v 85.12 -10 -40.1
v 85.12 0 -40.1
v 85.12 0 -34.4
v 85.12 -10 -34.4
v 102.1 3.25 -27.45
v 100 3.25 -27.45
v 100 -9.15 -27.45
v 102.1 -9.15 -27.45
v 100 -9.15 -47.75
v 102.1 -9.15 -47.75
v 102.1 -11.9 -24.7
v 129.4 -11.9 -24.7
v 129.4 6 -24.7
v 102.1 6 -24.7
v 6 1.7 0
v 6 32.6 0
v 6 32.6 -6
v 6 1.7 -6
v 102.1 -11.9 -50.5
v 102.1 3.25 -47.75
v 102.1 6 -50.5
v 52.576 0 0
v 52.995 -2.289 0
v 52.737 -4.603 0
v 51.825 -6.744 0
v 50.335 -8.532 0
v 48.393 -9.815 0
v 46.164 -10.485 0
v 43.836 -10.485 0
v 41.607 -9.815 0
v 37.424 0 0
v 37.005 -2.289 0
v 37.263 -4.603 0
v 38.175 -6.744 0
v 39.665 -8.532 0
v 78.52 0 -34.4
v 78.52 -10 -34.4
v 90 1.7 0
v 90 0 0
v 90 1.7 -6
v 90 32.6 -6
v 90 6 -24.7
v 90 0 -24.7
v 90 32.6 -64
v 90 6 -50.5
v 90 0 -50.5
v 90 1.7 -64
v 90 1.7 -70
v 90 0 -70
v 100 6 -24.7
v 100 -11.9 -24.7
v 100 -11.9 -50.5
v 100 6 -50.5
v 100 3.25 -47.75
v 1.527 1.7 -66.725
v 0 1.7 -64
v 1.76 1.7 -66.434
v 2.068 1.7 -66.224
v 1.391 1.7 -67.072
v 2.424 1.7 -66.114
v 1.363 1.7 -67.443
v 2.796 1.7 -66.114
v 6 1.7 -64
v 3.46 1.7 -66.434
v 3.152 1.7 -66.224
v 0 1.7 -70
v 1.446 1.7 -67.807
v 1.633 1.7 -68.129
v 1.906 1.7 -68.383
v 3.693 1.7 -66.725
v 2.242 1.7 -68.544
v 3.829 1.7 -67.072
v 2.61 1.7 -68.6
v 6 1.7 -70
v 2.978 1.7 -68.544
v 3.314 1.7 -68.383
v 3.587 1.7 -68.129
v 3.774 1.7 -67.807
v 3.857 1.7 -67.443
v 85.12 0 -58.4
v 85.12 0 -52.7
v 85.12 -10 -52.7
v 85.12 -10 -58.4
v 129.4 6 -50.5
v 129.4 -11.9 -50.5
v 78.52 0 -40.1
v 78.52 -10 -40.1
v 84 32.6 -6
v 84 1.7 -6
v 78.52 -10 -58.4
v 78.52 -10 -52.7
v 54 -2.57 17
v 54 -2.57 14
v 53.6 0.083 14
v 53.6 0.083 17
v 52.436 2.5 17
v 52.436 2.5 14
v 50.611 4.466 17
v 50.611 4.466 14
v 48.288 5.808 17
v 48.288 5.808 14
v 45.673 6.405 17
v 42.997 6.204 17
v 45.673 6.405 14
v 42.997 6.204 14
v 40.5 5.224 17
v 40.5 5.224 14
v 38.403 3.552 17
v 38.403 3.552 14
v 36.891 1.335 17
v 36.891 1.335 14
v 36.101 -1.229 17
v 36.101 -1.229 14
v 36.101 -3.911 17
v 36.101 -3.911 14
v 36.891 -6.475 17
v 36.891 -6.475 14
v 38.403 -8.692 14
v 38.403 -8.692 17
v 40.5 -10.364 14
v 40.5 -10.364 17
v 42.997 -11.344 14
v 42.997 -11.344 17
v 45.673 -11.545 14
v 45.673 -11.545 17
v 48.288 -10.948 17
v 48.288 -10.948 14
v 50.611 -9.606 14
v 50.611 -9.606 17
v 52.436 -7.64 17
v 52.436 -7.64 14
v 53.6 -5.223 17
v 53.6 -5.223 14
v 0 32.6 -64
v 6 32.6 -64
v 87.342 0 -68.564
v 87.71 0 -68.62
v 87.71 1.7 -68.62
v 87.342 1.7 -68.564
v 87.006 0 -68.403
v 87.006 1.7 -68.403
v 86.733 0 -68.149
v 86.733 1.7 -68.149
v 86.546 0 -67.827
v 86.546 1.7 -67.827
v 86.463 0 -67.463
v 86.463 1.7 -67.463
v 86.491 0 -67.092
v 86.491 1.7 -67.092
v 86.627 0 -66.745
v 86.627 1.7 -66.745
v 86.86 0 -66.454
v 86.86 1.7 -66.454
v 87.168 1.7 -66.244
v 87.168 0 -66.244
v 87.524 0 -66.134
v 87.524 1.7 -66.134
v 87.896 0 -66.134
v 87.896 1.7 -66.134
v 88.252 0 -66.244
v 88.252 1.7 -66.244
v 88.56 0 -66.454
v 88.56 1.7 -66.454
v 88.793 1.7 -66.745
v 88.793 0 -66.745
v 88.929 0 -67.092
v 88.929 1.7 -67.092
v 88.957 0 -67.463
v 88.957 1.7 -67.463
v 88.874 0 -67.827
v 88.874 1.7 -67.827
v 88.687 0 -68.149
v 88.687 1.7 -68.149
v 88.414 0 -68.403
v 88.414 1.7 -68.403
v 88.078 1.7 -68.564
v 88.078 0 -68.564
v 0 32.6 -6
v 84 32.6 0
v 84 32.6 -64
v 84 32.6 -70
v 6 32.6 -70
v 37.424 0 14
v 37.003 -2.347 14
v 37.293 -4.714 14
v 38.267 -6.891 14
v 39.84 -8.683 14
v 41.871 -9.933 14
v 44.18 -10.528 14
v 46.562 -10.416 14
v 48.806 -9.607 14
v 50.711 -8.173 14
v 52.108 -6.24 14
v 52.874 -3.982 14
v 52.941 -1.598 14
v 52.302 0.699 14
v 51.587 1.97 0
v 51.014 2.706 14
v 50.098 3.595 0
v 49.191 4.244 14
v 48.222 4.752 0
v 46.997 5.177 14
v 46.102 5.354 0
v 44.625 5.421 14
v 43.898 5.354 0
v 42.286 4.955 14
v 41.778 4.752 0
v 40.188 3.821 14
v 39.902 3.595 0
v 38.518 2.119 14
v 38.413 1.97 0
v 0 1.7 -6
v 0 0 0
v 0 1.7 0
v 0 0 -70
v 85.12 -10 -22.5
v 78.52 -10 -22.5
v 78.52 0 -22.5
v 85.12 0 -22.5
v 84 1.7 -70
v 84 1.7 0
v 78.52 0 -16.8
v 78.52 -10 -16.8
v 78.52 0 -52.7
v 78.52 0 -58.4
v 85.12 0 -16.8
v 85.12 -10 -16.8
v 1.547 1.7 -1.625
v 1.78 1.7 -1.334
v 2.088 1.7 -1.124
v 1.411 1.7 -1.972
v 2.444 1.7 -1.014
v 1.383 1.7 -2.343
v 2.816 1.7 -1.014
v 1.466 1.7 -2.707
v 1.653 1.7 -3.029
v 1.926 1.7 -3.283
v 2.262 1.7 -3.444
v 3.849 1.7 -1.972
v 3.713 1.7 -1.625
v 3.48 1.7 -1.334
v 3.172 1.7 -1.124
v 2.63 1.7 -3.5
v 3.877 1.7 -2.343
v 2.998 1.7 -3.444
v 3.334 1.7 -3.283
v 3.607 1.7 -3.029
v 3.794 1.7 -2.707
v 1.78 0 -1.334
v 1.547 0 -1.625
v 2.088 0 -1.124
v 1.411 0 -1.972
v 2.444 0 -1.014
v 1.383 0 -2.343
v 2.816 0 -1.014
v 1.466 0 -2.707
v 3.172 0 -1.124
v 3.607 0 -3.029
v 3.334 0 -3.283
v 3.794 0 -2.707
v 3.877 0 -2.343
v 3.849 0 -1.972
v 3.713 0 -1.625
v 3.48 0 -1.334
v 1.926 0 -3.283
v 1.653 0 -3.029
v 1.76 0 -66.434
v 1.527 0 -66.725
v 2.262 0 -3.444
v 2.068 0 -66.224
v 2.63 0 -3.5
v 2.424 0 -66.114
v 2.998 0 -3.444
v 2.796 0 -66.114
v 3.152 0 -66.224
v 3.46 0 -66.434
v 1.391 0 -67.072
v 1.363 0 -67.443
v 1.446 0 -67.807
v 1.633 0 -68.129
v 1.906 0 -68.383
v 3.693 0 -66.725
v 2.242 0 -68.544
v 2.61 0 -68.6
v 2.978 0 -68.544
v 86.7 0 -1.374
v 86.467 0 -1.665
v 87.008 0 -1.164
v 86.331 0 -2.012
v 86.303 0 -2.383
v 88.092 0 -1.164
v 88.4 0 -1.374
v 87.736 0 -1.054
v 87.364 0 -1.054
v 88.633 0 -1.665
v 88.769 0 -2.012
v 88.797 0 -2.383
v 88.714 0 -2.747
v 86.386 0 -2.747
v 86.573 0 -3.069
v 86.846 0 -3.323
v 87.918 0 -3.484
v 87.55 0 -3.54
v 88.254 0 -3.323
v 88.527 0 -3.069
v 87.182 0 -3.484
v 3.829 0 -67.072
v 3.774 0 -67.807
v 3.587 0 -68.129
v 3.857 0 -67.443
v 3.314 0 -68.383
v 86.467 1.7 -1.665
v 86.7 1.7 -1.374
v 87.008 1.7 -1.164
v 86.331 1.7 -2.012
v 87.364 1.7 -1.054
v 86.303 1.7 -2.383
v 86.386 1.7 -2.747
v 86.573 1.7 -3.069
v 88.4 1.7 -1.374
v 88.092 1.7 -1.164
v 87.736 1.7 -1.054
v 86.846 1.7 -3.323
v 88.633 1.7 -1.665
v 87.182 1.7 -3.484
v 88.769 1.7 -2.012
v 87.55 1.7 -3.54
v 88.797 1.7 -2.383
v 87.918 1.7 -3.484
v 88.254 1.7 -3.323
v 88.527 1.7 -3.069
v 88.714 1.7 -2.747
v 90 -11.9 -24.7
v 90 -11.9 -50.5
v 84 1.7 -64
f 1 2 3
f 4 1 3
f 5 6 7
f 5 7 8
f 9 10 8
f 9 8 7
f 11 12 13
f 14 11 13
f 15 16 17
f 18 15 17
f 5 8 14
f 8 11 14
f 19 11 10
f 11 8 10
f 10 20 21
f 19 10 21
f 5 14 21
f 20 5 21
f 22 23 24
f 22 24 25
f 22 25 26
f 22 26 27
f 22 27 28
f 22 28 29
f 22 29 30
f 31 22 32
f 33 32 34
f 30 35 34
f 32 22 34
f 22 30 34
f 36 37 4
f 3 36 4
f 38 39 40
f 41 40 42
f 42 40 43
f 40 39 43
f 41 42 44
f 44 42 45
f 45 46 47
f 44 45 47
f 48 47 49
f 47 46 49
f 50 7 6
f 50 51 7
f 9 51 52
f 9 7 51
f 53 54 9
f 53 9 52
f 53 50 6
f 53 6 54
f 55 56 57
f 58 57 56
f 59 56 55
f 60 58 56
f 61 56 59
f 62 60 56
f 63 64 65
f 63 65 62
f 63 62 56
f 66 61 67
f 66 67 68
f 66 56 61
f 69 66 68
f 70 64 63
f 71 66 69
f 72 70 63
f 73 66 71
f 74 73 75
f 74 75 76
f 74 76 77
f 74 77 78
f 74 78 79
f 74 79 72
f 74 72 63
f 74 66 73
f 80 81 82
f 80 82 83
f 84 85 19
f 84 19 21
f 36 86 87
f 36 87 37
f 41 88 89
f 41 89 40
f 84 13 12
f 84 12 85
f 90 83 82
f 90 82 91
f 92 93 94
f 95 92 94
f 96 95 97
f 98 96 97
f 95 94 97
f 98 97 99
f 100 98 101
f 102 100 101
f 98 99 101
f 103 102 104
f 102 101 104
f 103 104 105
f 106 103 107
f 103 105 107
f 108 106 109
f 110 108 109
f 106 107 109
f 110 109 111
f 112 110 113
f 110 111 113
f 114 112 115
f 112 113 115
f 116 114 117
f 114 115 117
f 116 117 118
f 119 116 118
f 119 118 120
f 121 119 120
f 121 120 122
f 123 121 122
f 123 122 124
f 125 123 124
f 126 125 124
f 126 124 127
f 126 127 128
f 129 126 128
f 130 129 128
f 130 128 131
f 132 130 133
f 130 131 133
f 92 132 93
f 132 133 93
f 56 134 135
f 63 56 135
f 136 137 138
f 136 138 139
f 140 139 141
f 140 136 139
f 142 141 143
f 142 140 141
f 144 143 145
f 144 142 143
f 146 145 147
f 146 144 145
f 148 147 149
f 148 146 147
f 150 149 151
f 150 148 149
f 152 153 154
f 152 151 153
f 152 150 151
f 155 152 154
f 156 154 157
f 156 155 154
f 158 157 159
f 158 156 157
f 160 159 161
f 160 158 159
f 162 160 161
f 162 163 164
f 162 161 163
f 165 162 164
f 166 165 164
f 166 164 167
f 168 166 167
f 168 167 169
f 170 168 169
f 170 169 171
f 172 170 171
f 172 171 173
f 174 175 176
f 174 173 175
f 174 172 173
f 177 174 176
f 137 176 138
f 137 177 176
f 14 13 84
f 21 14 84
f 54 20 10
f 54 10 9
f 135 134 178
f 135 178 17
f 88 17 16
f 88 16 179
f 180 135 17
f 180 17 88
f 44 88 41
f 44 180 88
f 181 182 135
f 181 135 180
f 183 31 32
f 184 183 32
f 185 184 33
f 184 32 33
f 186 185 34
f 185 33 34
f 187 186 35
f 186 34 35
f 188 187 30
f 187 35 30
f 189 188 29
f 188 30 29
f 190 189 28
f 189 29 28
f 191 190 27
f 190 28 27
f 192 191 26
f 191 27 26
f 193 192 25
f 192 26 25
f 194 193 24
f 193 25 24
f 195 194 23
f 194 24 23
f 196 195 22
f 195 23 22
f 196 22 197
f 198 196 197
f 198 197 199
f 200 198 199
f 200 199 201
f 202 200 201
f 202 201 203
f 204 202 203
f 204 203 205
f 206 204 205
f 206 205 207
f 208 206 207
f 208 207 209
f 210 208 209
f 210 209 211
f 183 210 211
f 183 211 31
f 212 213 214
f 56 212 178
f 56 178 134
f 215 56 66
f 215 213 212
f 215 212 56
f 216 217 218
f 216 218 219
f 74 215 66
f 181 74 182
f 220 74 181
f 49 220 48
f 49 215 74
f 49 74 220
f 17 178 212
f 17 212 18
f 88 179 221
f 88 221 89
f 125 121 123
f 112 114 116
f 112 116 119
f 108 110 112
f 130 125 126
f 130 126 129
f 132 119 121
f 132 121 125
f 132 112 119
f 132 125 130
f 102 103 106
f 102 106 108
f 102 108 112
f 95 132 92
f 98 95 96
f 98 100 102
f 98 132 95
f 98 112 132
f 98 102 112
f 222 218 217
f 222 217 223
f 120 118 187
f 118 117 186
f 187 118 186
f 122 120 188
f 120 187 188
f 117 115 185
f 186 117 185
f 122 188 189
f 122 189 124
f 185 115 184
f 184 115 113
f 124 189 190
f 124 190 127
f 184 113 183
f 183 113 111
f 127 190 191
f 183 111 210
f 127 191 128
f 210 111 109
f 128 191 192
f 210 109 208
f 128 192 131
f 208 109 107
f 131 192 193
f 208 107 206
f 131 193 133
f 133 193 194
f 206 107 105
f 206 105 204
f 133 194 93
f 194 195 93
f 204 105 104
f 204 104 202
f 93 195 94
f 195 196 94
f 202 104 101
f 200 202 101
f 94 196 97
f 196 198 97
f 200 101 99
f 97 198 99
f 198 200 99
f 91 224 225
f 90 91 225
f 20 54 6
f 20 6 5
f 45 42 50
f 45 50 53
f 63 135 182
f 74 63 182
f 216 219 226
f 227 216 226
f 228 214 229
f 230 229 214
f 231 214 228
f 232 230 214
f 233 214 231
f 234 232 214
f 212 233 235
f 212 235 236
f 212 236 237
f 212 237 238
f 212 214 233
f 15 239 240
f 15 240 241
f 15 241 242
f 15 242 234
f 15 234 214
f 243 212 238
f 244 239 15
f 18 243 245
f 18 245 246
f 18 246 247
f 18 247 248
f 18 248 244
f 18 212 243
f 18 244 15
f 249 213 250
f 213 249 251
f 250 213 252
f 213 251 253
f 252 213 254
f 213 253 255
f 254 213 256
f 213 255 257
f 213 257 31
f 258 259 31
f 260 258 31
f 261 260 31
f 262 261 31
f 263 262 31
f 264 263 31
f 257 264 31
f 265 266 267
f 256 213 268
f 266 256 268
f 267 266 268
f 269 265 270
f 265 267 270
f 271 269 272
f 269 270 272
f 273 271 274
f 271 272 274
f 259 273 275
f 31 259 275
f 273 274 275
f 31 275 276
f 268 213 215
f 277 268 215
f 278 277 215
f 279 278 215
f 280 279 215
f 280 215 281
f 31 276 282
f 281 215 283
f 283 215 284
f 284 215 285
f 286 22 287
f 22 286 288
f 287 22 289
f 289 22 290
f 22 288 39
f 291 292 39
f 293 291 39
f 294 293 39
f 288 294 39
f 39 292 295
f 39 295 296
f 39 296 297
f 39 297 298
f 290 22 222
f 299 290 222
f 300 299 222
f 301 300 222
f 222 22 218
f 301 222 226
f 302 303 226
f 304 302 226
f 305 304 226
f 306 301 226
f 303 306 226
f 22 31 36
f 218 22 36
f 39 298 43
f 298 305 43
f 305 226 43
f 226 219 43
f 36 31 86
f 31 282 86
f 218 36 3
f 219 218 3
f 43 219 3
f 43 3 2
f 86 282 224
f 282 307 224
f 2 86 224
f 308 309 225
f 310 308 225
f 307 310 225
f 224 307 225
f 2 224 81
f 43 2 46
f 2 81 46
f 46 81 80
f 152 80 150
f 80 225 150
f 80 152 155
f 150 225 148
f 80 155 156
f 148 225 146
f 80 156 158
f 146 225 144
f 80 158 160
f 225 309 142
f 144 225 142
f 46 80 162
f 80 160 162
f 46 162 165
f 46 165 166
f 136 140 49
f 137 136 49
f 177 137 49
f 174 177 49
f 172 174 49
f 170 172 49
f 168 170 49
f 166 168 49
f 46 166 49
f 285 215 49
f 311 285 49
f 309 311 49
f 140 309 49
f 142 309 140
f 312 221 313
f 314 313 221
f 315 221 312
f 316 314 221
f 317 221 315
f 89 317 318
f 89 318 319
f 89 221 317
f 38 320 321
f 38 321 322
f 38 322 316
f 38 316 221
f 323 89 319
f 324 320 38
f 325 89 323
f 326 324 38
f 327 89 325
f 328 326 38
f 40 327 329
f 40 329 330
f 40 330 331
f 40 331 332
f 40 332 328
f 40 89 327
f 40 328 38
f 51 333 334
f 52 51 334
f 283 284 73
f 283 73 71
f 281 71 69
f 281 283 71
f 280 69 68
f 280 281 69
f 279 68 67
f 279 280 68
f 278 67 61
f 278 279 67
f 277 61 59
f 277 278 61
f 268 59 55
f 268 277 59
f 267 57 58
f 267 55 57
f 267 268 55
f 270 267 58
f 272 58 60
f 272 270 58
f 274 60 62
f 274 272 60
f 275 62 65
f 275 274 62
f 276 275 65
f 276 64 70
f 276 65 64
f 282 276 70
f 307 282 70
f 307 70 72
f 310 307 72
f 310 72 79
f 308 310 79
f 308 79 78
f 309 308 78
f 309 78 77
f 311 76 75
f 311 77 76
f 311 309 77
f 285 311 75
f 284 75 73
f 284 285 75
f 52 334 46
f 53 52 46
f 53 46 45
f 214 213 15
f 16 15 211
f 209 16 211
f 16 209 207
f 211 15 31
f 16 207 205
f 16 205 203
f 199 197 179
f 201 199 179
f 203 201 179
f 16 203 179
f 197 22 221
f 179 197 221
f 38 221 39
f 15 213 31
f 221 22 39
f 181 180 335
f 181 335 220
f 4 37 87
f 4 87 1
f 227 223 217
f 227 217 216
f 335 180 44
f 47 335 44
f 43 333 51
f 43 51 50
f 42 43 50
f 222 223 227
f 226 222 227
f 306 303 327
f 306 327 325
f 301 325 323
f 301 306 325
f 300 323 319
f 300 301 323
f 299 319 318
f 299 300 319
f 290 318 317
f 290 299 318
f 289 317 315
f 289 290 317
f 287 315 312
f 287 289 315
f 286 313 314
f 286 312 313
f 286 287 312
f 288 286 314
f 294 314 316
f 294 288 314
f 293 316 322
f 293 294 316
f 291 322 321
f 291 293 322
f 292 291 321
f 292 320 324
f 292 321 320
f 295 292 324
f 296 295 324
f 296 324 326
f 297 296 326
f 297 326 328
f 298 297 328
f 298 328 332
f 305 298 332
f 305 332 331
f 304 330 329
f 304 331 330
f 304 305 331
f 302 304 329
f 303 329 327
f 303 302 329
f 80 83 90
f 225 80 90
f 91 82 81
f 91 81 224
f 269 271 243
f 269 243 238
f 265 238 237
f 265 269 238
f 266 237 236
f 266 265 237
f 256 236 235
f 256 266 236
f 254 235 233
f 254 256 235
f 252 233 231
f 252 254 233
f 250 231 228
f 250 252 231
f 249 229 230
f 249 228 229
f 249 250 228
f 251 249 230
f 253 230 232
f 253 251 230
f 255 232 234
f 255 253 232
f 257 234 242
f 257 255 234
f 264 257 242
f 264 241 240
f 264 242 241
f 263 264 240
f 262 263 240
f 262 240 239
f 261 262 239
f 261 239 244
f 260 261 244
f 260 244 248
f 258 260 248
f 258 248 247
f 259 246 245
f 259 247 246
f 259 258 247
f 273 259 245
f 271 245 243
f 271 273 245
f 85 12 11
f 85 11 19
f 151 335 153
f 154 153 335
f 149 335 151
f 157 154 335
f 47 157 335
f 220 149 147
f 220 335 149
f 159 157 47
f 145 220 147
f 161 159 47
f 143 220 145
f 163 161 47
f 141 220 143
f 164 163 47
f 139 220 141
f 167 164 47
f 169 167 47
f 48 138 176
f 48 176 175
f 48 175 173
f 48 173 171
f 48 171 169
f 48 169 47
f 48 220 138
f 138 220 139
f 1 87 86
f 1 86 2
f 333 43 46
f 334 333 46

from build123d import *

# Parameters (mm, degrees)
SKETCH2_W               = 90
SKETCH2_H               = 70
BOSS_EXTRUDE1_DEPTH     = 32.6
SKETCH4_R               = 8
BOSS_EXTRUDE2_DEPTH     = 14
SKETCH6_W               = 6.6
SKETCH6_H               = 5.7
BOSS_EXTRUDE3_DEPTH     = 10
SKETCH10_W              = 6.6
SKETCH10_H              = 5.7
BOSS_EXTRUDE4_DEPTH     = 10
SKETCH7_W               = 6.6
SKETCH7_H               = 5.7
BOSS_EXTRUDE5_DEPTH     = 10
CUT_EXTRUDE1_DEPTH      = 122.916565322
CUT_EXTRUDE1_DEPTH_BACK = 122.916565322
SKETCH11_R              = 1.25
CUT_EXTRUDE2_DEPTH      = 122.916565322
CUT_EXTRUDE2_DEPTH_BACK = 122.916565322
SKETCH15_R              = 1.25
CUT_EXTRUDE3_DEPTH      = 122.916565322
CUT_EXTRUDE3_DEPTH_BACK = 122.916565322
SKETCH14_R              = 1.25
CUT_EXTRUDE4_DEPTH      = 122.916565322
CUT_EXTRUDE4_DEPTH_BACK = 122.916565322
SKETCH12_R              = 1.25
SKETCH16_W              = 6
SKETCH16_H              = 6
CUT_EXTRUDE5_DEPTH      = 30.9
SKETCH19_W              = 6
SKETCH19_H              = 6
CUT_EXTRUDE6_DEPTH      = 30.9
SKETCH18_W              = 6
SKETCH18_H              = 6
CUT_EXTRUDE7_DEPTH      = 30.9
SKETCH17_W              = 6
SKETCH17_H              = 6
CUT_EXTRUDE8_DEPTH      = 30.9
SKETCH20_W              = 25.8
SKETCH20_H              = 17.9
BOSS_EXTRUDE6_DEPTH     = 39.4
SKETCH22_W              = 2.1
SKETCH22_H              = 17.9
CUT_EXTRUDE9_DEPTH      = 2.75
SKETCH24_W              = 2.1
SKETCH24_H              = 25.8
CUT_EXTRUDE10_DEPTH     = 2.75
SKETCH25_W              = 2.1
SKETCH25_H              = 17.9
CUT_EXTRUDE11_DEPTH     = 2.75
SKETCH26_W              = 2.1
SKETCH26_H              = 25.8
CUT_EXTRUDE12_DEPTH     = 2.75
SKETCH27_R              = 9
BOSS_EXTRUDE7_DEPTH     = 3


with BuildPart() as part:
    # Sketch2 → Boss-Extrude1 (new body)
    with BuildSketch(Plane(origin=(0, 0, 0), x_dir=(1, 0, 0), z_dir=(0, 1, 0))):
        with Locations((45, 35)):
            Rectangle(SKETCH2_W, SKETCH2_H)
    extrude(amount=BOSS_EXTRUDE1_DEPTH)

    # Sketch4 → Boss-Extrude2 (add)
    with BuildSketch(Plane.XY):
        with Locations(Location((45, -2.57, 0), (0, 0, 161.261463564))):
            Circle(SKETCH4_R)
    extrude(amount=BOSS_EXTRUDE2_DEPTH)

    # Sketch6 → Boss-Extrude3 (add)
    with BuildSketch(Plane(origin=(0, 0, 0), x_dir=(-1, 0, 0), z_dir=(0, -1, 0))):
        with Locations((-81.82, 55.55)):
            Rectangle(SKETCH6_W, SKETCH6_H)
    extrude(amount=BOSS_EXTRUDE3_DEPTH)

    # Sketch10 → Boss-Extrude4 (add)
    with BuildSketch(Plane.XZ):
        with Locations((81.82, -37.25)):
            Rectangle(SKETCH10_W, SKETCH10_H)
    extrude(amount=BOSS_EXTRUDE4_DEPTH)

    # Sketch7 → Boss-Extrude5 (add)
    with BuildSketch(Plane.XZ):
        with Locations((81.82, -19.65)):
            Rectangle(SKETCH7_W, SKETCH7_H)
    extrude(amount=BOSS_EXTRUDE5_DEPTH)

    # Sketch11 → Cut-Extrude1 (cut, two sides: drawn at the far end of the back side and taken through both)
    with BuildSketch(Plane(origin=(0, 32.6, 0), x_dir=(1, 0, 0), z_dir=(0, 1, 0)).offset(-CUT_EXTRUDE1_DEPTH_BACK)):
        with Locations(Location((87.55, 2.29, 0), (0, 0, 90))):
            Circle(SKETCH11_R)
    extrude(amount=CUT_EXTRUDE1_DEPTH + CUT_EXTRUDE1_DEPTH_BACK, mode=Mode.SUBTRACT)

    # Sketch15 → Cut-Extrude2 (cut, two sides: drawn at the far end of the back side and taken through both)
    with BuildSketch(Plane(origin=(0, 32.6, 0), x_dir=(1, 0, 0), z_dir=(0, 1, 0)).offset(-CUT_EXTRUDE2_DEPTH_BACK)):
        with Locations(Location((2.61, 67.35, 0), (0, 0, 90))):
            Circle(SKETCH15_R)
    extrude(amount=CUT_EXTRUDE2_DEPTH + CUT_EXTRUDE2_DEPTH_BACK, mode=Mode.SUBTRACT)

    # Sketch14 → Cut-Extrude3 (cut, two sides: drawn at the far end of the back side and taken through both)
    with BuildSketch(Plane(origin=(0, 32.6, 0), x_dir=(1, 0, 0), z_dir=(0, 1, 0)).offset(-CUT_EXTRUDE3_DEPTH_BACK)):
        with Locations(Location((2.63, 2.25, 0), (0, 0, 90))):
            Circle(SKETCH14_R)
    extrude(amount=CUT_EXTRUDE3_DEPTH + CUT_EXTRUDE3_DEPTH_BACK, mode=Mode.SUBTRACT)

    # Sketch12 → Cut-Extrude4 (cut, two sides: drawn at the far end of the back side and taken through both)
    with BuildSketch(Plane(origin=(0, 32.6, 0), x_dir=(1, 0, 0), z_dir=(0, 1, 0)).offset(-CUT_EXTRUDE4_DEPTH_BACK)):
        with Locations(Location((87.71, 67.37, 0), (0, 0, 90))):
            Circle(SKETCH12_R)
    extrude(amount=CUT_EXTRUDE4_DEPTH + CUT_EXTRUDE4_DEPTH_BACK, mode=Mode.SUBTRACT)

    # Sketch16 → Cut-Extrude5 (cut)
    with BuildSketch(Plane(origin=(0, 32.6, 0), x_dir=(1, 0, 0), z_dir=(0, 1, 0))):
        with Locations((3, 67)):
            Rectangle(SKETCH16_W, SKETCH16_H)
    extrude(amount=-CUT_EXTRUDE5_DEPTH, mode=Mode.SUBTRACT)

    # Sketch19 → Cut-Extrude6 (cut)
    with BuildSketch(Plane(origin=(0, 32.6, 0), x_dir=(1, 0, 0), z_dir=(0, 1, 0))):
        with Locations((3, 3)):
            Rectangle(SKETCH19_W, SKETCH19_H)
    extrude(amount=-CUT_EXTRUDE6_DEPTH, mode=Mode.SUBTRACT)

    # Sketch18 → Cut-Extrude7 (cut)
    with BuildSketch(Plane(origin=(0, 32.6, 0), x_dir=(1, 0, 0), z_dir=(0, 1, 0))):
        with Locations((87, 3)):
            Rectangle(SKETCH18_W, SKETCH18_H)
    extrude(amount=-CUT_EXTRUDE7_DEPTH, mode=Mode.SUBTRACT)

    # Sketch17 → Cut-Extrude8 (cut)
    with BuildSketch(Plane(origin=(0, 32.6, 0), x_dir=(1, 0, 0), z_dir=(0, 1, 0))):
        with Locations((87, 67)):
            Rectangle(SKETCH17_W, SKETCH17_H)
    extrude(amount=-CUT_EXTRUDE8_DEPTH, mode=Mode.SUBTRACT)

    # Sketch20 → Boss-Extrude6 (add)
    with BuildSketch(Plane(origin=(90, 0, 0), x_dir=(0, 0, -1), z_dir=(1, 0, 0))):
        with Locations((37.6, -2.95)):
            Rectangle(SKETCH20_W, SKETCH20_H)
    extrude(amount=BOSS_EXTRUDE6_DEPTH)

    # Sketch22 → Cut-Extrude9 (cut)
    with BuildSketch(Plane(origin=(0, 0, -50.5), x_dir=(-1, 0, 0), z_dir=(0, 0, -1))):
        with Locations((-101.05, -2.95)):
            Rectangle(SKETCH22_W, SKETCH22_H)
    extrude(amount=-CUT_EXTRUDE9_DEPTH, mode=Mode.SUBTRACT)

    # Sketch24 → Cut-Extrude10 (cut)
    with BuildSketch(Plane(origin=(0, 6, 0), x_dir=(1, 0, 0), z_dir=(0, 1, 0))):
        with Locations((101.05, 37.6)):
            Rectangle(SKETCH24_W, SKETCH24_H)
    extrude(amount=-CUT_EXTRUDE10_DEPTH, mode=Mode.SUBTRACT)

    # Sketch25 → Cut-Extrude11 (cut)
    with BuildSketch(Plane.XY.offset(-24.7)):
        with Locations((101.05, -2.95)):
            Rectangle(SKETCH25_W, SKETCH25_H)
    extrude(amount=-CUT_EXTRUDE11_DEPTH, mode=Mode.SUBTRACT)

    # Sketch26 → Cut-Extrude12 (cut)
    with BuildSketch(Plane(origin=(0, -11.9, 0), x_dir=(-1, 0, 0), z_dir=(0, -1, 0))):
        with Locations((-101.05, 37.6)):
            Rectangle(SKETCH26_W, SKETCH26_H)
    extrude(amount=-CUT_EXTRUDE12_DEPTH, mode=Mode.SUBTRACT)

    # Sketch27 → Boss-Extrude7 (add)
    with BuildSketch(Plane.XY.offset(14)):
        with Locations((45, -2.57)):
            Circle(SKETCH27_R)
    extrude(amount=BOSS_EXTRUDE7_DEPTH)


solid = part.part
